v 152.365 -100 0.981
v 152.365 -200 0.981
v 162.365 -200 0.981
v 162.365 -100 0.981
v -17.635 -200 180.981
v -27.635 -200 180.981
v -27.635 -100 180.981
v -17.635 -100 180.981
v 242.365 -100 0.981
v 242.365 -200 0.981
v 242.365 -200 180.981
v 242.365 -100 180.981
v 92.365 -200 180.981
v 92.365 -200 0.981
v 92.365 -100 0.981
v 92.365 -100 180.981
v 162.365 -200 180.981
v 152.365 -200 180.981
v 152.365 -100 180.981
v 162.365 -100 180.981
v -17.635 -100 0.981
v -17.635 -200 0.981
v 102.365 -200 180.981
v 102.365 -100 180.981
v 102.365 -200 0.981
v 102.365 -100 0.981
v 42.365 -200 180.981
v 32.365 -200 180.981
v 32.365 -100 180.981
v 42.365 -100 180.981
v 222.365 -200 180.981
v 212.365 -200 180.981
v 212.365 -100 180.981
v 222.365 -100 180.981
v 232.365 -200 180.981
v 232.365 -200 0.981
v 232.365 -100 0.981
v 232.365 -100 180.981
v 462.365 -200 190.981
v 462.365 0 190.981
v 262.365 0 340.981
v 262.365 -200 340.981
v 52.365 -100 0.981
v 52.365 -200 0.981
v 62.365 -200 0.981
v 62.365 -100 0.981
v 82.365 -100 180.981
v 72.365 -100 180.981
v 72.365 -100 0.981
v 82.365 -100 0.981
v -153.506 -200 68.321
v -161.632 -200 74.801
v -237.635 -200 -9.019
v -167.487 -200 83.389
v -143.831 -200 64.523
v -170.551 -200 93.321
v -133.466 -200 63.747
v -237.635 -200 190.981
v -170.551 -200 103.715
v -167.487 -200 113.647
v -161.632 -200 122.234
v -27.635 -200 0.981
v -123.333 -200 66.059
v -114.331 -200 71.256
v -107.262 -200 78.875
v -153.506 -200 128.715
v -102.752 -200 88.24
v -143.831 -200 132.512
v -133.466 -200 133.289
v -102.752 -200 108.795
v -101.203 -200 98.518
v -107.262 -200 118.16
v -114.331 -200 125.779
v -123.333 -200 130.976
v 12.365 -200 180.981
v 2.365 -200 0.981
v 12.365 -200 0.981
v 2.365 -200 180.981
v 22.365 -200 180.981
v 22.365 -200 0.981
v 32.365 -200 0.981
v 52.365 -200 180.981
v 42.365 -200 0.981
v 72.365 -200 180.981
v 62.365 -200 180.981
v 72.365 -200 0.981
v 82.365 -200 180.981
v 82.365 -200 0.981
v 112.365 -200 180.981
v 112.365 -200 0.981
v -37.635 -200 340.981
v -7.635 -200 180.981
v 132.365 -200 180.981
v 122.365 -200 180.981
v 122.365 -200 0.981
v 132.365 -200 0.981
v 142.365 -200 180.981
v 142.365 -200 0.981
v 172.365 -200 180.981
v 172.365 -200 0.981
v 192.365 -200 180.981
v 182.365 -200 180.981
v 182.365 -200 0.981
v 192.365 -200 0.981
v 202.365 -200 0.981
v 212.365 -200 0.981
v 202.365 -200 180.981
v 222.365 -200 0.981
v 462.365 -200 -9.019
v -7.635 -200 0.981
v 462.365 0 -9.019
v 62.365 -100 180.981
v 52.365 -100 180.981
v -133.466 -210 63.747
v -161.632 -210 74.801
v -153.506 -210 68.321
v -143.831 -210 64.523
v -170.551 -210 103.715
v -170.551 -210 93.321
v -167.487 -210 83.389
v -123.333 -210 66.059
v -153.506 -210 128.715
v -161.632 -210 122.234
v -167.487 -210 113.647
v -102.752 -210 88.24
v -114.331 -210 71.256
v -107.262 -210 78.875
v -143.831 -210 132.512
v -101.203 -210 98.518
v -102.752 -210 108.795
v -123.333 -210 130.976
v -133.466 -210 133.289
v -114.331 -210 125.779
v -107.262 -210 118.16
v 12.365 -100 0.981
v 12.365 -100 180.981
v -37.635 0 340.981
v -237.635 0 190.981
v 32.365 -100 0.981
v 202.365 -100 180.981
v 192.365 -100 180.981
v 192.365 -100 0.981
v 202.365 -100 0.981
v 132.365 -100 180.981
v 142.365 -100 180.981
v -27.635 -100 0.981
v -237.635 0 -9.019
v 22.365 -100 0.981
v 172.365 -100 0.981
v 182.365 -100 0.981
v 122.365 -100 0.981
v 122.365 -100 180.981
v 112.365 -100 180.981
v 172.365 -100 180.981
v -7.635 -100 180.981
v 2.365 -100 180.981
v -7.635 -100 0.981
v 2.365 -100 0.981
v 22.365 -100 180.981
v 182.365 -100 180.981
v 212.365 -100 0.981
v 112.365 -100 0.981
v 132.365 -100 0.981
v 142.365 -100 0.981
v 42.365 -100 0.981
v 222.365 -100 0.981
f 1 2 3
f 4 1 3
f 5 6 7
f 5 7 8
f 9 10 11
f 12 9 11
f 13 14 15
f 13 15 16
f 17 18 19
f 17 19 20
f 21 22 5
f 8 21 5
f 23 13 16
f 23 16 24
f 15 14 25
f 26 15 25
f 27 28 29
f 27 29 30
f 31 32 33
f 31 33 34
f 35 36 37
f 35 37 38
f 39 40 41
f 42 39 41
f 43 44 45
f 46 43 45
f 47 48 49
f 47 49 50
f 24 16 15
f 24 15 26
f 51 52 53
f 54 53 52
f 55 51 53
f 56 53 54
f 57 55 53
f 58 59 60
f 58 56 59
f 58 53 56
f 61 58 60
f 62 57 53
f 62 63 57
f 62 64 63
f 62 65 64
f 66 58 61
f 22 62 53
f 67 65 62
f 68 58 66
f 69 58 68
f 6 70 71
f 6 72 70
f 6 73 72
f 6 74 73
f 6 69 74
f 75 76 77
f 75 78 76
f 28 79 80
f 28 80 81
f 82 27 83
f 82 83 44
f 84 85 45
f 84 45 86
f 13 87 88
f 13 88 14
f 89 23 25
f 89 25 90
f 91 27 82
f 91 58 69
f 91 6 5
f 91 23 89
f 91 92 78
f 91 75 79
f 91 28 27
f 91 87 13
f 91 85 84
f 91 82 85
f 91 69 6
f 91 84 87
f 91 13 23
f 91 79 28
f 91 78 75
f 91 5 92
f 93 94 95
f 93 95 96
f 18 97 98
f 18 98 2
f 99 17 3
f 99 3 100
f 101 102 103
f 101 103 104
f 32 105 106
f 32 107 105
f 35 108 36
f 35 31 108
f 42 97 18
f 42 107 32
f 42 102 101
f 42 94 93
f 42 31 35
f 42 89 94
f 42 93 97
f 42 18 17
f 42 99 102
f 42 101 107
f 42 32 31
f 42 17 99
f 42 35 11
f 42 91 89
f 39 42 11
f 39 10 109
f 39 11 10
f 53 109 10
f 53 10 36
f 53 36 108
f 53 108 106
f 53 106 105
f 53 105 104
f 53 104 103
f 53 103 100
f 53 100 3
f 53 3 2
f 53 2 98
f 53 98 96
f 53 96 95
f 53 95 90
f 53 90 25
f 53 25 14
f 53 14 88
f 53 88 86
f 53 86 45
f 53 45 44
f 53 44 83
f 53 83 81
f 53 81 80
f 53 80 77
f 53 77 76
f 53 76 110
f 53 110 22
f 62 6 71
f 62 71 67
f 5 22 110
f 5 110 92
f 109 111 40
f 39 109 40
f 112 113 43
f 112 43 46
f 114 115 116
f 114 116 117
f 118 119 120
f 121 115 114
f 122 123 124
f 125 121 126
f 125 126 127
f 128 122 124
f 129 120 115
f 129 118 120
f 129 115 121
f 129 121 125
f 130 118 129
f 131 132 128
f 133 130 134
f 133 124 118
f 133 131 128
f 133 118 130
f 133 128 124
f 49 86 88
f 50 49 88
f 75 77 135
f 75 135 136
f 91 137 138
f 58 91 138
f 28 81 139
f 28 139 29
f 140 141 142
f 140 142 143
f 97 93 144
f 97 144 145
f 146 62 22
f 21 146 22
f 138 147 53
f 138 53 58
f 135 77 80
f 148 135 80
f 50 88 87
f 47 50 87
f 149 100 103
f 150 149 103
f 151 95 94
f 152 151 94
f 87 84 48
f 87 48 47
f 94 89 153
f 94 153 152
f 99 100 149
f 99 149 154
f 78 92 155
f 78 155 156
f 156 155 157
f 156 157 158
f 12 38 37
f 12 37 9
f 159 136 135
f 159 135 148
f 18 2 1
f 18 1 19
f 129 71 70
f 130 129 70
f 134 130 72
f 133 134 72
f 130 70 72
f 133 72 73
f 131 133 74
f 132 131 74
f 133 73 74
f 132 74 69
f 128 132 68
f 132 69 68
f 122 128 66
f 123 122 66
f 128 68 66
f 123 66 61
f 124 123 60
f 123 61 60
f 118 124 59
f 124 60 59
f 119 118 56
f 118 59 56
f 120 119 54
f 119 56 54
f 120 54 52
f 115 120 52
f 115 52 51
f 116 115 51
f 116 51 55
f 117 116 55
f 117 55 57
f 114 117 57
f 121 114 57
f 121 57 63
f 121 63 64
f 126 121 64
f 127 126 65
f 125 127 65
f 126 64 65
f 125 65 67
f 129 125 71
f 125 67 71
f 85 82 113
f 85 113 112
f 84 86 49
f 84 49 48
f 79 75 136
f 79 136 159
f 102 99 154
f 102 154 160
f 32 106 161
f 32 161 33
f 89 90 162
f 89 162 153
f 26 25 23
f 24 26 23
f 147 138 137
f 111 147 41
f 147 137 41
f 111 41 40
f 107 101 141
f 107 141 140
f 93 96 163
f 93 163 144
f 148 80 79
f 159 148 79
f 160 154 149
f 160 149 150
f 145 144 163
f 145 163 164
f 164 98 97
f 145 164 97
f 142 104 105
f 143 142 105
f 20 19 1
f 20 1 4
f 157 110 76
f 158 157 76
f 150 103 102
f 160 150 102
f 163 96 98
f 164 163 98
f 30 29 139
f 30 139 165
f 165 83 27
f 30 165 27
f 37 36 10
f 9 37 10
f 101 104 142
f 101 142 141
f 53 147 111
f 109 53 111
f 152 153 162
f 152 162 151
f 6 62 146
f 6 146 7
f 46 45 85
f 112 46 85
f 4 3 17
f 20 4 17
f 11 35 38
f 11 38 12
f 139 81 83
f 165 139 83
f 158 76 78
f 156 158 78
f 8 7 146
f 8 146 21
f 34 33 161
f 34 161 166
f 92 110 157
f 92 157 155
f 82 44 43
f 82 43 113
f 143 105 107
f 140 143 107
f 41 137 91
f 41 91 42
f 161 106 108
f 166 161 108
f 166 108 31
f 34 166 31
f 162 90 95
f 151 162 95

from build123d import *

# Parameters (mm, degrees)
F0_W     = 200
F0_H     = 200
F0_W_2   = 300
F0_H_2   = 150
F1_DEPTH = 200
F2_W     = 10
F2_H     = 180
F3_DEPTH = 100
F4_R     = 34.8685713904
F5_DEPTH = 10


with BuildPart() as f1:
    # F0 (on Front) → F1 (new body)
    with BuildSketch(Plane.XZ):
        Polygon((-37.6349433511, 340.9807319556), (-237.6349433511, 190.9807319556), (-37.6349433511, 190.9807319556), align=None)
        with Locations((-137.6349433511, 90.9807319556)):
            Rectangle(F0_W, F0_H)
        with Locations((112.3650566489, 265.9807319556)):
            Rectangle(F0_W_2, F0_H_2)
        with Locations((112.3650566489, 90.9807319556)):
            Rectangle(F0_W_2, F0_H)
        Polygon((262.3650566489, 340.9807319556), (262.3650566489, 190.9807319556), (462.3650566489, 190.9807319556), align=None)
        with Locations((362.3650566489, 90.9807319556)):
            Rectangle(F0_W, F0_H)
    extrude(amount=F1_DEPTH)

    # F2 (on face) → F3 (cut)
    with BuildSketch(Plane.XZ.offset(200)):
        with Locations((-22.6349433511, 90.9807319556)):
            Rectangle(F2_W, F2_H)
        with Locations((-2.6349433511, 90.9807319556)):
            Rectangle(F2_W, F2_H)
        with Locations((17.3650566489, 90.9807319556)):
            Rectangle(F2_W, F2_H)
        with Locations((37.3650566489, 90.9807319556)):
            Rectangle(F2_W, F2_H)
        with Locations((57.3650566489, 90.9807319556)):
            Rectangle(F2_W, F2_H)
        with Locations((77.3650566489, 90.9807319556)):
            Rectangle(F2_W, F2_H)
        with Locations((97.3650566489, 90.9807319556)):
            Rectangle(F2_W, F2_H)
        with Locations((117.3650566489, 90.9807319556)):
            Rectangle(F2_W, F2_H)
        with Locations((137.3650566489, 90.9807319556)):
            Rectangle(F2_W, F2_H)
        with Locations((157.3650566489, 90.9807319556)):
            Rectangle(F2_W, F2_H)
        with Locations((177.3650566489, 90.9807319556)):
            Rectangle(F2_W, F2_H)
        with Locations((197.3650566489, 90.9807319556)):
            Rectangle(F2_W, F2_H)
        with Locations((217.3650566489, 90.9807319556)):
            Rectangle(F2_W, F2_H)
        with Locations((237.3650566489, 90.9807319556)):
            Rectangle(F2_W, F2_H)
    extrude(amount=-F3_DEPTH, mode=Mode.SUBTRACT)

    # F4 (on face) → F5 (join)
    with BuildSketch(Plane.XZ.offset(200)):
        with Locations((-136.0715925694, 98.517626524)):
            Circle(F4_R)
    extrude(amount=F5_DEPTH)


solid = f1.part
